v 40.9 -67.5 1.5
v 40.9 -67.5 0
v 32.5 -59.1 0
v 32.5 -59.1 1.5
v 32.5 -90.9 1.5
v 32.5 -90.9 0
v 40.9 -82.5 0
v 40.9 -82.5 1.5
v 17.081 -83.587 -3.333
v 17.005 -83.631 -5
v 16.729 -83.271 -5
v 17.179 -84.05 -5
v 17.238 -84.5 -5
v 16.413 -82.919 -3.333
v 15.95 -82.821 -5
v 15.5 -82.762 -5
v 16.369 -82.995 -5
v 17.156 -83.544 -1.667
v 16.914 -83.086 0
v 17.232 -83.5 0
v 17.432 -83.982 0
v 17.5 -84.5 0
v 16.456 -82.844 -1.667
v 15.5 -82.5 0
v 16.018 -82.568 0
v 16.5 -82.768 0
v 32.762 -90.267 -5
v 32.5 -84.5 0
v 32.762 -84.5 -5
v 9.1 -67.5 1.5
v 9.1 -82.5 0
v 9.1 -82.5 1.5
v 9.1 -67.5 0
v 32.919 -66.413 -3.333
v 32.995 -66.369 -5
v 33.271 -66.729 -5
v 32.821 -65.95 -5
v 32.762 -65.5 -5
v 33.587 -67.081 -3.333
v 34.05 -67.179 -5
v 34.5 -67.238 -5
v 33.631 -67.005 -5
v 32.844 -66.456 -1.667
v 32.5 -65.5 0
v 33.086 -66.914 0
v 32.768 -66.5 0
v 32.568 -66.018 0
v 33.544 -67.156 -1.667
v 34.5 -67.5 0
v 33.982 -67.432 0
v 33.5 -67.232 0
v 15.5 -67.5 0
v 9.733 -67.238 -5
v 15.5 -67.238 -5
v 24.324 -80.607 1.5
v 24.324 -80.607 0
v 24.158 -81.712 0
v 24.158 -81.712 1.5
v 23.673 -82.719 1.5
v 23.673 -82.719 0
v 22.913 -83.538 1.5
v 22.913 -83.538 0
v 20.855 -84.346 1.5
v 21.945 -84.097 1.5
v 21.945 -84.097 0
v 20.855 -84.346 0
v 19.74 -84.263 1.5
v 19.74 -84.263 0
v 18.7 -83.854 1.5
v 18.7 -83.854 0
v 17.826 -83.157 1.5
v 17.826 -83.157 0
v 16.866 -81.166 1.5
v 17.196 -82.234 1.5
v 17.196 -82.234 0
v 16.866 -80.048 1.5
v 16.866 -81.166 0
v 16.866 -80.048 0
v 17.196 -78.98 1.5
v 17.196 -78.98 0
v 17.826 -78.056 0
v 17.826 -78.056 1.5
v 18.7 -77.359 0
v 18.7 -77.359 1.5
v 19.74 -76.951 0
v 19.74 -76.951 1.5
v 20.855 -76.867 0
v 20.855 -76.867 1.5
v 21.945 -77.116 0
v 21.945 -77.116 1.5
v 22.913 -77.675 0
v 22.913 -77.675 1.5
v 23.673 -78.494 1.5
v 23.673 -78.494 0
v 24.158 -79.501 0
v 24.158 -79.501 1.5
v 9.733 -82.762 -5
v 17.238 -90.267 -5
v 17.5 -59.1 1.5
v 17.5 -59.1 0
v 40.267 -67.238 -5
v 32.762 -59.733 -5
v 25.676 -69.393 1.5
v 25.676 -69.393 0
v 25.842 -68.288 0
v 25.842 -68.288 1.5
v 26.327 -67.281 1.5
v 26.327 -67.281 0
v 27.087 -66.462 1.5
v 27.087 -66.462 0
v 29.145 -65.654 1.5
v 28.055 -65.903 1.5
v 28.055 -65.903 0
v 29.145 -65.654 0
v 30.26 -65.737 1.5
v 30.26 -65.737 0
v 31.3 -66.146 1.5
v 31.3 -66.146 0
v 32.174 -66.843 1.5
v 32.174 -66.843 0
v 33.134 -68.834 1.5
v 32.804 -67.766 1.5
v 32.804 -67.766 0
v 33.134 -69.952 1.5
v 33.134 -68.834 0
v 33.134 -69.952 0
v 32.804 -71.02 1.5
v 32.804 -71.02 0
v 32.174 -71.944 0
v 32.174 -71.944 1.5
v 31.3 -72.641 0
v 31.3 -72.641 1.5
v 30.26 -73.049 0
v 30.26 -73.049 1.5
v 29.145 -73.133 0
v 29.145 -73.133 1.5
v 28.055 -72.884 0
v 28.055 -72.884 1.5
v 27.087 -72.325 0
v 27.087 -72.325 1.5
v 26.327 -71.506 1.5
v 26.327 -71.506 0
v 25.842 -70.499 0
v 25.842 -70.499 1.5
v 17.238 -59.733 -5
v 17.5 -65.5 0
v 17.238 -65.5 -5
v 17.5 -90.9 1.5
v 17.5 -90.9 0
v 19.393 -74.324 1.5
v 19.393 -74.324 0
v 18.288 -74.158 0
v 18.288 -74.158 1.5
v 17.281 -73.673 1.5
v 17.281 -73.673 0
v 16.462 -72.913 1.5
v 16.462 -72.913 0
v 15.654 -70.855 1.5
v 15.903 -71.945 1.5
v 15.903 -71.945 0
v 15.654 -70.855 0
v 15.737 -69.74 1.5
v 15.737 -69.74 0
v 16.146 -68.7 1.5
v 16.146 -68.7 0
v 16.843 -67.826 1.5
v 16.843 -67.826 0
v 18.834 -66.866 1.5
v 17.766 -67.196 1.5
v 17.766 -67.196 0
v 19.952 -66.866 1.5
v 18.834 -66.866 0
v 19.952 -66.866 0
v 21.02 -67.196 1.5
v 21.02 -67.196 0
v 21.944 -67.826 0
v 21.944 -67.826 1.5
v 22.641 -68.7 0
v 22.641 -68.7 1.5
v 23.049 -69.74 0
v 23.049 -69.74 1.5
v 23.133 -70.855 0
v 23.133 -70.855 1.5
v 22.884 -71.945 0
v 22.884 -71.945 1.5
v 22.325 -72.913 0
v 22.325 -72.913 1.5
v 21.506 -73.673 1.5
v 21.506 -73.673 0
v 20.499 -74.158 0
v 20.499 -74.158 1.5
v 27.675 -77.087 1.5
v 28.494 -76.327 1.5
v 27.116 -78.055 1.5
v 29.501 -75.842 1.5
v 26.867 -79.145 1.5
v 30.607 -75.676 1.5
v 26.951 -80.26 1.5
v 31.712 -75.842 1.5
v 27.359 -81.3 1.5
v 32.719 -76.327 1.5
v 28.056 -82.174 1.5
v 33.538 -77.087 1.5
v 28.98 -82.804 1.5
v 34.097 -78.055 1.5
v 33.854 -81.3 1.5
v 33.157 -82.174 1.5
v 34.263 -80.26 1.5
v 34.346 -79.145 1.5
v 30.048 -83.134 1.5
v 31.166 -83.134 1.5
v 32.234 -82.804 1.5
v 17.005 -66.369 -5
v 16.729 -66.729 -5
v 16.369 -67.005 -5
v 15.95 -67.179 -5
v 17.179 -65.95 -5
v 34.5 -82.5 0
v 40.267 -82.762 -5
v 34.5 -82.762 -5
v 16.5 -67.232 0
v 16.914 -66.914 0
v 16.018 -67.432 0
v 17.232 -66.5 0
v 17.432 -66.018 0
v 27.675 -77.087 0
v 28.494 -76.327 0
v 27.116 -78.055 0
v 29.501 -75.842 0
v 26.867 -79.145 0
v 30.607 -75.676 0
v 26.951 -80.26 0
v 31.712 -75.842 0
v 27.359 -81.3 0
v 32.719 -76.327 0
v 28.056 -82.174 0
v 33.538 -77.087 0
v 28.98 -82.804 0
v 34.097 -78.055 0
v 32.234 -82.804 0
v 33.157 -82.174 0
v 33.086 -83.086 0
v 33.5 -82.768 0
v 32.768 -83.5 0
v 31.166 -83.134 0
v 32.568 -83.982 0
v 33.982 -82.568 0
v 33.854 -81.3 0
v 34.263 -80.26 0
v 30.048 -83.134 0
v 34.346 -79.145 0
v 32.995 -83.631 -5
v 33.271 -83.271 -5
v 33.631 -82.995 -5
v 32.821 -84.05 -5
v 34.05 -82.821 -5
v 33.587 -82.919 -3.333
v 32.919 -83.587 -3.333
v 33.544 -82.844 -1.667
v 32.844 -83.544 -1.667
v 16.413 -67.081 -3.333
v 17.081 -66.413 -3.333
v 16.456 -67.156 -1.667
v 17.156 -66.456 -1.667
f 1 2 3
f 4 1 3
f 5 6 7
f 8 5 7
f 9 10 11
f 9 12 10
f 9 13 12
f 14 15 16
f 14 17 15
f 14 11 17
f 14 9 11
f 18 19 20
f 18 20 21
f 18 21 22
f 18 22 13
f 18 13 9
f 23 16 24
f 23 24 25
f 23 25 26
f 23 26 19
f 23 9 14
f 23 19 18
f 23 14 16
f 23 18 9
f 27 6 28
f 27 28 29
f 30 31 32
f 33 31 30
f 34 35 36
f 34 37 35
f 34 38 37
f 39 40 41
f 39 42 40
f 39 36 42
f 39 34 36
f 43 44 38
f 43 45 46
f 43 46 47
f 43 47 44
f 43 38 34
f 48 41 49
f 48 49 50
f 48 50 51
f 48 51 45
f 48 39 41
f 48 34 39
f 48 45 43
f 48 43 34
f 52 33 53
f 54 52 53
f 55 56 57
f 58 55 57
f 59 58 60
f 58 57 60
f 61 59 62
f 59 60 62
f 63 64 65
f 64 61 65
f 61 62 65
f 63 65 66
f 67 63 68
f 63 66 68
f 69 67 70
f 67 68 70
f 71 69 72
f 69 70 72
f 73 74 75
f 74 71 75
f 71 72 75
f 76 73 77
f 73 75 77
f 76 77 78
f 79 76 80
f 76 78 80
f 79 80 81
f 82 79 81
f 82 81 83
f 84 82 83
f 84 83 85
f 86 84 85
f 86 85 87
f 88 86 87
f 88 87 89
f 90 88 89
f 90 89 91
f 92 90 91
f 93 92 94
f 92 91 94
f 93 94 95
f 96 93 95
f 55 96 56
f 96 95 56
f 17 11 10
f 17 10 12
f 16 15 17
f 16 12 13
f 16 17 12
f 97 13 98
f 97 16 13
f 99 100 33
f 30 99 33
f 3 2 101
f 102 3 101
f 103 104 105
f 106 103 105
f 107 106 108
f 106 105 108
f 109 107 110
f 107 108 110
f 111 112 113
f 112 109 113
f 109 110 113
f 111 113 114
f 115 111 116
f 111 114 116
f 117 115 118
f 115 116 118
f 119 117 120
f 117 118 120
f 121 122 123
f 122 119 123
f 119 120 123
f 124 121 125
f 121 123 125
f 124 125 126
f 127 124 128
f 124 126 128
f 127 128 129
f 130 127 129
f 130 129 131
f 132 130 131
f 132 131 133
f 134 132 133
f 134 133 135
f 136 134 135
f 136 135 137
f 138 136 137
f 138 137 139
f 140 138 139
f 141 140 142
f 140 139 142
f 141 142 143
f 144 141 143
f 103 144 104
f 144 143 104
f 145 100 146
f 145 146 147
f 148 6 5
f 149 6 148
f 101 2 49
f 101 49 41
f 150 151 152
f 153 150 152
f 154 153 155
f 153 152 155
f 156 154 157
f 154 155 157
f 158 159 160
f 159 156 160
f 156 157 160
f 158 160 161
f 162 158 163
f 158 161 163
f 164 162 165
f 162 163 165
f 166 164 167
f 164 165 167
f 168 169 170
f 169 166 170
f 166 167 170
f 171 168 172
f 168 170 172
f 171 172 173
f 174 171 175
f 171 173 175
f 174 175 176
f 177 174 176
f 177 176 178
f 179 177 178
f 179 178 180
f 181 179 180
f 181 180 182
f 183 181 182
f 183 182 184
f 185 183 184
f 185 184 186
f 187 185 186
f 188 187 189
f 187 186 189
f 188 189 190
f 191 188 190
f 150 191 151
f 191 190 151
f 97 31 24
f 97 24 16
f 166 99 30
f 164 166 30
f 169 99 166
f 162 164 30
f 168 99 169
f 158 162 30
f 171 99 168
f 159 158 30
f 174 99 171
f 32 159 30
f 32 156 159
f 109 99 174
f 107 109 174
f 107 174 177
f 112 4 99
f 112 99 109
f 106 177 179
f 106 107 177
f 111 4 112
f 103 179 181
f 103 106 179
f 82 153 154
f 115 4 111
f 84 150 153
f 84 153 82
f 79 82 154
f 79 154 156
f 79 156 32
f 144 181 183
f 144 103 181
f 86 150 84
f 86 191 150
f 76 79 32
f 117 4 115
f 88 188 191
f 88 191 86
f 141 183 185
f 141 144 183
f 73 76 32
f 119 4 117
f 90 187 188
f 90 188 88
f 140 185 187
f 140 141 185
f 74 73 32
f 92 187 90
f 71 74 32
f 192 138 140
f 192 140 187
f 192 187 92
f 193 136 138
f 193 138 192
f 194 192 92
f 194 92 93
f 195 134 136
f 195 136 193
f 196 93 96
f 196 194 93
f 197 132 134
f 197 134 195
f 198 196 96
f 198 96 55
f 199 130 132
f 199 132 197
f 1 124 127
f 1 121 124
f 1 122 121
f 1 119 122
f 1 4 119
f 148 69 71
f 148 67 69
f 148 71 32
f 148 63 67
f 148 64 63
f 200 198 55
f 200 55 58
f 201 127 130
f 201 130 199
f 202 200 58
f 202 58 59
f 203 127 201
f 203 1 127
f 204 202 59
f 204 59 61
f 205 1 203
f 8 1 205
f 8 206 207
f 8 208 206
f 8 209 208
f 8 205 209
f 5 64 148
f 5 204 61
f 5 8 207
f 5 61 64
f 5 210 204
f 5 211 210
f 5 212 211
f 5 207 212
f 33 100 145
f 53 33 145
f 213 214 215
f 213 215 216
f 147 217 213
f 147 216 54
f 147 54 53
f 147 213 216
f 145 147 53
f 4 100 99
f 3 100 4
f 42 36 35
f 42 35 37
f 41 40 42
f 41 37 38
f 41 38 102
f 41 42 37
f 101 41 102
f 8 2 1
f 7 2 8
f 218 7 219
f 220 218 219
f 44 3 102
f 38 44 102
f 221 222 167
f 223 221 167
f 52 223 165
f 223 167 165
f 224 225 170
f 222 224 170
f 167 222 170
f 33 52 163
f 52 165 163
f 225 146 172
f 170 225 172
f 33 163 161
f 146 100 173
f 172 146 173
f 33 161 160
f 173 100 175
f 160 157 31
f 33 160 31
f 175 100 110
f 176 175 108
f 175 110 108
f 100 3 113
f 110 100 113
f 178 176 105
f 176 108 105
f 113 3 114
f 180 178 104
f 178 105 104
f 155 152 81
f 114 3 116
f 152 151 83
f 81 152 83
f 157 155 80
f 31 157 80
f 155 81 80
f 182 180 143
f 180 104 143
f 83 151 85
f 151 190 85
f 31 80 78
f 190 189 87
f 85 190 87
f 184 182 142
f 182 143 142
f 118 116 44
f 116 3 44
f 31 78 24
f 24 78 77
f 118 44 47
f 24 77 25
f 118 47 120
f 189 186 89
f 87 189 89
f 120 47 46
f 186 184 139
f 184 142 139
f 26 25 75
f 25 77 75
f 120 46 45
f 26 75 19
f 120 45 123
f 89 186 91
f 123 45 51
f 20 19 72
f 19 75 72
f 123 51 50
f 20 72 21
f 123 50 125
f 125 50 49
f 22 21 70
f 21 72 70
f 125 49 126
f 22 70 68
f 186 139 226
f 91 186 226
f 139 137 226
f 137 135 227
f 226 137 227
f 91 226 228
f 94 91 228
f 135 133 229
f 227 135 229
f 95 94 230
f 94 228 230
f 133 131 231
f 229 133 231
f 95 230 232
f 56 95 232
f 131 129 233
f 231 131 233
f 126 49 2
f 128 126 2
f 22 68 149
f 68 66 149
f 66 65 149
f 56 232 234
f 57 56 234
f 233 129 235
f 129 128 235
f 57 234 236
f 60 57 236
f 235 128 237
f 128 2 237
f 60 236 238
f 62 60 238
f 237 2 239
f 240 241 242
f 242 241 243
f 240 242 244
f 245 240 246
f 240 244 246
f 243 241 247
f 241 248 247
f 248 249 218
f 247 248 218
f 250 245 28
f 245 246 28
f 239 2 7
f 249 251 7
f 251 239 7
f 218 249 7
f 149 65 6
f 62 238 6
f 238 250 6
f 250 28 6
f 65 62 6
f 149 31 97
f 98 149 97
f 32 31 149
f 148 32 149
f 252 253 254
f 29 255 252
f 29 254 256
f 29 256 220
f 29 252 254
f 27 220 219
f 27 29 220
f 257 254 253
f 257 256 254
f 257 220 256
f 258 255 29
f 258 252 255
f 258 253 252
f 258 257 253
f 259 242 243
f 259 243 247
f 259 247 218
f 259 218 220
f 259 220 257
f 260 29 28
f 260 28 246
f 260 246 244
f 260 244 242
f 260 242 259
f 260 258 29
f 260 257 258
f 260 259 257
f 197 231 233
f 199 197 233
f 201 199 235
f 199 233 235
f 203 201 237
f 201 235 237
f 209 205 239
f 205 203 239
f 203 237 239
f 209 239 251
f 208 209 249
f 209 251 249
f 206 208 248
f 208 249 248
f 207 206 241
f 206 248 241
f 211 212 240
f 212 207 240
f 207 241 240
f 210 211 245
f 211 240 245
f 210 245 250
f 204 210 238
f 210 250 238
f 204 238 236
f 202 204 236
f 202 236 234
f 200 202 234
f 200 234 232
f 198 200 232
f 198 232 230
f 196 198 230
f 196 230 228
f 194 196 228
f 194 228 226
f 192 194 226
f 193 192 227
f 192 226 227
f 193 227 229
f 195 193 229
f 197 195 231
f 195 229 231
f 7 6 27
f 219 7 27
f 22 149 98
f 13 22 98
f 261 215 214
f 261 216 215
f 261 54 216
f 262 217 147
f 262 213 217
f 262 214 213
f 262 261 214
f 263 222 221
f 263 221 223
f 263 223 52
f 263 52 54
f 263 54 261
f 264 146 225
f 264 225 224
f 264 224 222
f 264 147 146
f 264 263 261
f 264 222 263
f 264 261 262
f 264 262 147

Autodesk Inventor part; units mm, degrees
ref_plane "YZ Plane" through (0, 0, 0) normal (1, 0, 0) x (0, 1, 0)
ref_plane "XZ Plane" through (0, 0, 0) normal (0, 1, 0) x (-1, 0, 0)
ref_plane "XY Plane" through (0, 0, 0) normal (0, 0, 1) x (1, 0, 0)
ref_plane "Work Plane1" through (50, -100, 0) normal (0, 0, 1) x (1, 0, 0)
sketch "Sketch1" plane through (50, -100, 0) normal (0, 0, 1) x (1, 0, 0)
  line L0 (-9.1, 25) -> (-9.1, 17.5) construction
  line L1 (-9.1, 25) -> (-25, 25) construction
  line L2 (-25, 25) -> (-25, 9.1) construction
  line L3 (-17.5, 9.1) -> (-25, 9.1) construction
  line L4 (-17.5, 9.1) -> (-17.5, 15.5) construction
  arc A0 (-15.5, 17.5) -> (-17.5, 15.5) centre (-15.5, 15.5) ccw construction
  line L5 (-15.5, 17.5) -> (-9.1, 17.5) construction
  circle A1 centre (-20, 20) radius 2.2989 construction
  line L6 (-40.9, 17.5) -> (-40.9, 25)
  line L7 (-40.9, 17.5) -> (-34.5, 17.5) construction
  arc A2 (-32.5, 15.5) -> (-34.5, 17.5) centre (-34.5, 15.5) ccw construction
  line L8 (-32.5, 15.5) -> (-32.5, 9.1) construction
  line L9 (-25, 9.1) -> (-32.5, 9.1)
  line L10 (-25, 9.1) -> (-25, 25) construction
  line L11 (-25, 25) -> (-40.9, 25) construction
  circle A3 centre (-30, 20) radius 2.2989 construction
  line L12 (-40.9, 25) -> (-40.9, 32.5) construction
  line L13 (-40.9, 25) -> (-25, 25)
  line L14 (-25, 25) -> (-25, 40.9) construction
  line L15 (-32.5, 40.9) -> (-25, 40.9) construction
  line L16 (-32.5, 40.9) -> (-32.5, 34.5) construction
  arc A4 (-34.5, 32.5) -> (-32.5, 34.5) centre (-34.5, 34.5) ccw construction
  line L17 (-34.5, 32.5) -> (-40.9, 32.5) construction
  circle A5 centre (-30, 30) radius 2.2989 construction
  circle A6 centre (-20, 30) radius 2.2989 construction
  line L18 (-25, 40.9) -> (-17.5, 40.9) construction
  line L19 (-25, 40.9) -> (-25, 25) construction
  line L20 (-25, 25) -> (-9.1, 25) construction
  line L21 (-9.1, 32.5) -> (-9.1, 25) construction
  line L22 (-9.1, 32.5) -> (-15.5, 32.5) construction
  arc A7 (-17.5, 34.5) -> (-15.5, 32.5) centre (-15.5, 34.5) ccw construction
  line L23 (-17.5, 34.5) -> (-17.5, 40.9) construction
  line L24 (-25, 9.1) -> (-32.5, 9.1)
  line L25 (-40.9, 17.5) -> (-32.5, 9.1)
  line L26 (-40.9, 17.5) -> (-40.9, 25)
  line L27 (-25, 25) -> (-40.9, 25)
  line L28 (-25, 9.1) -> (-25, 25)
  arc A8 (-32.5755, 19.3934) -> (-26.2755, 19.3934) centre (-29.4255, 19.3934) ccw projected
  circle A9 centre (-29.4255, 19.3934) radius 3.75
  line L29 (-40.9, 17.5) -> (-40.9, 25) projected
  line L30 (-25, 9.1) -> (-32.5, 9.1) projected
  line L31 (-40.9, 25) -> (-25, 25) projected
  point P0 (-50, 100)
  dimension "d0" = 7.5
extrude "Extrusion1" add sketch "Sketch1" along normal blind 1.5
sketch "Sketch2" plane through (50, -100, 0) normal (0, 0, -1) x (-1, 0, 0)
  circle A0 centre (29.4255, 19.3934) radius 3.75 projected
  line L0 (25, 25) -> (40.9, 25) projected
  line L1 (25, 9.1) -> (25, 25) projected
  line L2 (32.5, 9.1) -> (25, 9.1) projected
  line L3 (40.9, 17.5) -> (32.5, 9.1) projected
  line L4 (40.9, 25) -> (40.9, 17.5) projected
  line L5 (32.5, -15.5) -> (32.5, 15.5) projected
  arc A1 (34.5, 17.5) -> (32.5, 15.5) centre (34.5, 15.5) ccw projected
  line L6 (34.5, 17.5) -> (65.5, 17.5) projected
  line L7 (65.4275, 17.6356) -> (34.5, 17.6356)
  arc A2 (34.5, 17.6356) -> (32.3644, 15.5) centre (34.5, 15.5) ccw
  line L8 (32.3644, 15.5) -> (32.3644, -15.5)
  line L9 (40.9, 17.5) -> (32.5, 9.1) projected
  point P0 (50, 100)
  point P1 (41.0356, 17.6356)
  point P2 (32.3644, 8.9644)
extrude "Extrusion2" add sketch "Sketch2" along normal blind 5 draft -3 contours L3 L5 A1 L6
pattern_circular "Circular Pattern1" count 4 over 360 about axis through (25, -75, 0) along (0, 0, 1) of "Extrusion1", "Extrusion2"
properties part number "30_Baseplate_Connector_Clamp"
